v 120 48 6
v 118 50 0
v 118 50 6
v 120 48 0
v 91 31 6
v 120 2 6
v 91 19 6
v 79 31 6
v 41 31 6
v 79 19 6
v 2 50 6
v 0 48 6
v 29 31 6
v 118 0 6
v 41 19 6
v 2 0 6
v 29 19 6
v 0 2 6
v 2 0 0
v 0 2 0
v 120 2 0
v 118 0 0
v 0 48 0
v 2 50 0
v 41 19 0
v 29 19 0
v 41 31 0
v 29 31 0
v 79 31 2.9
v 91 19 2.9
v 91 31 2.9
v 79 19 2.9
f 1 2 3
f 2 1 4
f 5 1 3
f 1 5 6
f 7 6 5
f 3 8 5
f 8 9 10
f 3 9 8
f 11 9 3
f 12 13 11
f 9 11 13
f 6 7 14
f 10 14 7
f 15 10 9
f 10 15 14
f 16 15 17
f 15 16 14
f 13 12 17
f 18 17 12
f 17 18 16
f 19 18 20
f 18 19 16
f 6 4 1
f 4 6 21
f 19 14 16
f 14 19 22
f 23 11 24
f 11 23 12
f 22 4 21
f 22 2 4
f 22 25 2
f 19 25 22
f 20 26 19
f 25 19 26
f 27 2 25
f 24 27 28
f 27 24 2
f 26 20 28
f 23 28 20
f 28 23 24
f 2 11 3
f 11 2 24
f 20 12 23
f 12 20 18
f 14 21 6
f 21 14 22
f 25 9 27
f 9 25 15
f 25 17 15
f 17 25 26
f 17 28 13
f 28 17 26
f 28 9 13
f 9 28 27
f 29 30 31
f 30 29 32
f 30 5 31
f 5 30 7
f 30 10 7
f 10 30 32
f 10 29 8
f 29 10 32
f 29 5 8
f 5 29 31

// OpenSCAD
$fn = 32;

// ----------------------------------------------------------------------
// Windowed plate: 2 voids, 120 x 50 x 6 mm
// ----------------------------------------------------------------------

// --- parameters (mm) ---
plate_l = 120;            // plate length, X
plate_w = 50;             // plate width, Y
plate_t = 6;              // plate thickness, Z
edge_margin = 10;         // wall from the plate edge to any window
windows = 2;              // number of windows in the row
win_l = 12;               // window length
win_w = 12;               // window width
win_pitch = 50;           // window pitch along X
depth_1 = 6;              // depth of void 1 (full thickness = through)
depth_2 = 3.1;            // depth of void 2 (full thickness = through)
corner_c = 2;             // corner chamfer of the plate
fit_tol = 0.1;            // declared fit tolerance (prompt contract)
free_tol = 0.5;           // declared free tolerance (prompt contract)

profile = [[2, 0], [118, 0], [120, 2], [120, 48], [118, 50], [2, 50], [0, 48], [0, 2]];  // primary outline, 8 points, counter clockwise
void_1 = [[29, 19], [41, 19], [41, 31], [29, 31]];  // window 1 of the row, 4 points
void_2 = [[79, 19], [91, 19], [91, 31], [79, 31]];  // window 2 of the row, 4 points

// --- the one profile operation ---
difference() {
  linear_extrude(height = plate_t) polygon(points = profile);
  translate([0, 0, -1])
    linear_extrude(height = plate_t + 2) polygon(points = void_1);
  translate([0, 0, plate_t - depth_2])
    linear_extrude(height = depth_2 + 1) polygon(points = void_2);
}
